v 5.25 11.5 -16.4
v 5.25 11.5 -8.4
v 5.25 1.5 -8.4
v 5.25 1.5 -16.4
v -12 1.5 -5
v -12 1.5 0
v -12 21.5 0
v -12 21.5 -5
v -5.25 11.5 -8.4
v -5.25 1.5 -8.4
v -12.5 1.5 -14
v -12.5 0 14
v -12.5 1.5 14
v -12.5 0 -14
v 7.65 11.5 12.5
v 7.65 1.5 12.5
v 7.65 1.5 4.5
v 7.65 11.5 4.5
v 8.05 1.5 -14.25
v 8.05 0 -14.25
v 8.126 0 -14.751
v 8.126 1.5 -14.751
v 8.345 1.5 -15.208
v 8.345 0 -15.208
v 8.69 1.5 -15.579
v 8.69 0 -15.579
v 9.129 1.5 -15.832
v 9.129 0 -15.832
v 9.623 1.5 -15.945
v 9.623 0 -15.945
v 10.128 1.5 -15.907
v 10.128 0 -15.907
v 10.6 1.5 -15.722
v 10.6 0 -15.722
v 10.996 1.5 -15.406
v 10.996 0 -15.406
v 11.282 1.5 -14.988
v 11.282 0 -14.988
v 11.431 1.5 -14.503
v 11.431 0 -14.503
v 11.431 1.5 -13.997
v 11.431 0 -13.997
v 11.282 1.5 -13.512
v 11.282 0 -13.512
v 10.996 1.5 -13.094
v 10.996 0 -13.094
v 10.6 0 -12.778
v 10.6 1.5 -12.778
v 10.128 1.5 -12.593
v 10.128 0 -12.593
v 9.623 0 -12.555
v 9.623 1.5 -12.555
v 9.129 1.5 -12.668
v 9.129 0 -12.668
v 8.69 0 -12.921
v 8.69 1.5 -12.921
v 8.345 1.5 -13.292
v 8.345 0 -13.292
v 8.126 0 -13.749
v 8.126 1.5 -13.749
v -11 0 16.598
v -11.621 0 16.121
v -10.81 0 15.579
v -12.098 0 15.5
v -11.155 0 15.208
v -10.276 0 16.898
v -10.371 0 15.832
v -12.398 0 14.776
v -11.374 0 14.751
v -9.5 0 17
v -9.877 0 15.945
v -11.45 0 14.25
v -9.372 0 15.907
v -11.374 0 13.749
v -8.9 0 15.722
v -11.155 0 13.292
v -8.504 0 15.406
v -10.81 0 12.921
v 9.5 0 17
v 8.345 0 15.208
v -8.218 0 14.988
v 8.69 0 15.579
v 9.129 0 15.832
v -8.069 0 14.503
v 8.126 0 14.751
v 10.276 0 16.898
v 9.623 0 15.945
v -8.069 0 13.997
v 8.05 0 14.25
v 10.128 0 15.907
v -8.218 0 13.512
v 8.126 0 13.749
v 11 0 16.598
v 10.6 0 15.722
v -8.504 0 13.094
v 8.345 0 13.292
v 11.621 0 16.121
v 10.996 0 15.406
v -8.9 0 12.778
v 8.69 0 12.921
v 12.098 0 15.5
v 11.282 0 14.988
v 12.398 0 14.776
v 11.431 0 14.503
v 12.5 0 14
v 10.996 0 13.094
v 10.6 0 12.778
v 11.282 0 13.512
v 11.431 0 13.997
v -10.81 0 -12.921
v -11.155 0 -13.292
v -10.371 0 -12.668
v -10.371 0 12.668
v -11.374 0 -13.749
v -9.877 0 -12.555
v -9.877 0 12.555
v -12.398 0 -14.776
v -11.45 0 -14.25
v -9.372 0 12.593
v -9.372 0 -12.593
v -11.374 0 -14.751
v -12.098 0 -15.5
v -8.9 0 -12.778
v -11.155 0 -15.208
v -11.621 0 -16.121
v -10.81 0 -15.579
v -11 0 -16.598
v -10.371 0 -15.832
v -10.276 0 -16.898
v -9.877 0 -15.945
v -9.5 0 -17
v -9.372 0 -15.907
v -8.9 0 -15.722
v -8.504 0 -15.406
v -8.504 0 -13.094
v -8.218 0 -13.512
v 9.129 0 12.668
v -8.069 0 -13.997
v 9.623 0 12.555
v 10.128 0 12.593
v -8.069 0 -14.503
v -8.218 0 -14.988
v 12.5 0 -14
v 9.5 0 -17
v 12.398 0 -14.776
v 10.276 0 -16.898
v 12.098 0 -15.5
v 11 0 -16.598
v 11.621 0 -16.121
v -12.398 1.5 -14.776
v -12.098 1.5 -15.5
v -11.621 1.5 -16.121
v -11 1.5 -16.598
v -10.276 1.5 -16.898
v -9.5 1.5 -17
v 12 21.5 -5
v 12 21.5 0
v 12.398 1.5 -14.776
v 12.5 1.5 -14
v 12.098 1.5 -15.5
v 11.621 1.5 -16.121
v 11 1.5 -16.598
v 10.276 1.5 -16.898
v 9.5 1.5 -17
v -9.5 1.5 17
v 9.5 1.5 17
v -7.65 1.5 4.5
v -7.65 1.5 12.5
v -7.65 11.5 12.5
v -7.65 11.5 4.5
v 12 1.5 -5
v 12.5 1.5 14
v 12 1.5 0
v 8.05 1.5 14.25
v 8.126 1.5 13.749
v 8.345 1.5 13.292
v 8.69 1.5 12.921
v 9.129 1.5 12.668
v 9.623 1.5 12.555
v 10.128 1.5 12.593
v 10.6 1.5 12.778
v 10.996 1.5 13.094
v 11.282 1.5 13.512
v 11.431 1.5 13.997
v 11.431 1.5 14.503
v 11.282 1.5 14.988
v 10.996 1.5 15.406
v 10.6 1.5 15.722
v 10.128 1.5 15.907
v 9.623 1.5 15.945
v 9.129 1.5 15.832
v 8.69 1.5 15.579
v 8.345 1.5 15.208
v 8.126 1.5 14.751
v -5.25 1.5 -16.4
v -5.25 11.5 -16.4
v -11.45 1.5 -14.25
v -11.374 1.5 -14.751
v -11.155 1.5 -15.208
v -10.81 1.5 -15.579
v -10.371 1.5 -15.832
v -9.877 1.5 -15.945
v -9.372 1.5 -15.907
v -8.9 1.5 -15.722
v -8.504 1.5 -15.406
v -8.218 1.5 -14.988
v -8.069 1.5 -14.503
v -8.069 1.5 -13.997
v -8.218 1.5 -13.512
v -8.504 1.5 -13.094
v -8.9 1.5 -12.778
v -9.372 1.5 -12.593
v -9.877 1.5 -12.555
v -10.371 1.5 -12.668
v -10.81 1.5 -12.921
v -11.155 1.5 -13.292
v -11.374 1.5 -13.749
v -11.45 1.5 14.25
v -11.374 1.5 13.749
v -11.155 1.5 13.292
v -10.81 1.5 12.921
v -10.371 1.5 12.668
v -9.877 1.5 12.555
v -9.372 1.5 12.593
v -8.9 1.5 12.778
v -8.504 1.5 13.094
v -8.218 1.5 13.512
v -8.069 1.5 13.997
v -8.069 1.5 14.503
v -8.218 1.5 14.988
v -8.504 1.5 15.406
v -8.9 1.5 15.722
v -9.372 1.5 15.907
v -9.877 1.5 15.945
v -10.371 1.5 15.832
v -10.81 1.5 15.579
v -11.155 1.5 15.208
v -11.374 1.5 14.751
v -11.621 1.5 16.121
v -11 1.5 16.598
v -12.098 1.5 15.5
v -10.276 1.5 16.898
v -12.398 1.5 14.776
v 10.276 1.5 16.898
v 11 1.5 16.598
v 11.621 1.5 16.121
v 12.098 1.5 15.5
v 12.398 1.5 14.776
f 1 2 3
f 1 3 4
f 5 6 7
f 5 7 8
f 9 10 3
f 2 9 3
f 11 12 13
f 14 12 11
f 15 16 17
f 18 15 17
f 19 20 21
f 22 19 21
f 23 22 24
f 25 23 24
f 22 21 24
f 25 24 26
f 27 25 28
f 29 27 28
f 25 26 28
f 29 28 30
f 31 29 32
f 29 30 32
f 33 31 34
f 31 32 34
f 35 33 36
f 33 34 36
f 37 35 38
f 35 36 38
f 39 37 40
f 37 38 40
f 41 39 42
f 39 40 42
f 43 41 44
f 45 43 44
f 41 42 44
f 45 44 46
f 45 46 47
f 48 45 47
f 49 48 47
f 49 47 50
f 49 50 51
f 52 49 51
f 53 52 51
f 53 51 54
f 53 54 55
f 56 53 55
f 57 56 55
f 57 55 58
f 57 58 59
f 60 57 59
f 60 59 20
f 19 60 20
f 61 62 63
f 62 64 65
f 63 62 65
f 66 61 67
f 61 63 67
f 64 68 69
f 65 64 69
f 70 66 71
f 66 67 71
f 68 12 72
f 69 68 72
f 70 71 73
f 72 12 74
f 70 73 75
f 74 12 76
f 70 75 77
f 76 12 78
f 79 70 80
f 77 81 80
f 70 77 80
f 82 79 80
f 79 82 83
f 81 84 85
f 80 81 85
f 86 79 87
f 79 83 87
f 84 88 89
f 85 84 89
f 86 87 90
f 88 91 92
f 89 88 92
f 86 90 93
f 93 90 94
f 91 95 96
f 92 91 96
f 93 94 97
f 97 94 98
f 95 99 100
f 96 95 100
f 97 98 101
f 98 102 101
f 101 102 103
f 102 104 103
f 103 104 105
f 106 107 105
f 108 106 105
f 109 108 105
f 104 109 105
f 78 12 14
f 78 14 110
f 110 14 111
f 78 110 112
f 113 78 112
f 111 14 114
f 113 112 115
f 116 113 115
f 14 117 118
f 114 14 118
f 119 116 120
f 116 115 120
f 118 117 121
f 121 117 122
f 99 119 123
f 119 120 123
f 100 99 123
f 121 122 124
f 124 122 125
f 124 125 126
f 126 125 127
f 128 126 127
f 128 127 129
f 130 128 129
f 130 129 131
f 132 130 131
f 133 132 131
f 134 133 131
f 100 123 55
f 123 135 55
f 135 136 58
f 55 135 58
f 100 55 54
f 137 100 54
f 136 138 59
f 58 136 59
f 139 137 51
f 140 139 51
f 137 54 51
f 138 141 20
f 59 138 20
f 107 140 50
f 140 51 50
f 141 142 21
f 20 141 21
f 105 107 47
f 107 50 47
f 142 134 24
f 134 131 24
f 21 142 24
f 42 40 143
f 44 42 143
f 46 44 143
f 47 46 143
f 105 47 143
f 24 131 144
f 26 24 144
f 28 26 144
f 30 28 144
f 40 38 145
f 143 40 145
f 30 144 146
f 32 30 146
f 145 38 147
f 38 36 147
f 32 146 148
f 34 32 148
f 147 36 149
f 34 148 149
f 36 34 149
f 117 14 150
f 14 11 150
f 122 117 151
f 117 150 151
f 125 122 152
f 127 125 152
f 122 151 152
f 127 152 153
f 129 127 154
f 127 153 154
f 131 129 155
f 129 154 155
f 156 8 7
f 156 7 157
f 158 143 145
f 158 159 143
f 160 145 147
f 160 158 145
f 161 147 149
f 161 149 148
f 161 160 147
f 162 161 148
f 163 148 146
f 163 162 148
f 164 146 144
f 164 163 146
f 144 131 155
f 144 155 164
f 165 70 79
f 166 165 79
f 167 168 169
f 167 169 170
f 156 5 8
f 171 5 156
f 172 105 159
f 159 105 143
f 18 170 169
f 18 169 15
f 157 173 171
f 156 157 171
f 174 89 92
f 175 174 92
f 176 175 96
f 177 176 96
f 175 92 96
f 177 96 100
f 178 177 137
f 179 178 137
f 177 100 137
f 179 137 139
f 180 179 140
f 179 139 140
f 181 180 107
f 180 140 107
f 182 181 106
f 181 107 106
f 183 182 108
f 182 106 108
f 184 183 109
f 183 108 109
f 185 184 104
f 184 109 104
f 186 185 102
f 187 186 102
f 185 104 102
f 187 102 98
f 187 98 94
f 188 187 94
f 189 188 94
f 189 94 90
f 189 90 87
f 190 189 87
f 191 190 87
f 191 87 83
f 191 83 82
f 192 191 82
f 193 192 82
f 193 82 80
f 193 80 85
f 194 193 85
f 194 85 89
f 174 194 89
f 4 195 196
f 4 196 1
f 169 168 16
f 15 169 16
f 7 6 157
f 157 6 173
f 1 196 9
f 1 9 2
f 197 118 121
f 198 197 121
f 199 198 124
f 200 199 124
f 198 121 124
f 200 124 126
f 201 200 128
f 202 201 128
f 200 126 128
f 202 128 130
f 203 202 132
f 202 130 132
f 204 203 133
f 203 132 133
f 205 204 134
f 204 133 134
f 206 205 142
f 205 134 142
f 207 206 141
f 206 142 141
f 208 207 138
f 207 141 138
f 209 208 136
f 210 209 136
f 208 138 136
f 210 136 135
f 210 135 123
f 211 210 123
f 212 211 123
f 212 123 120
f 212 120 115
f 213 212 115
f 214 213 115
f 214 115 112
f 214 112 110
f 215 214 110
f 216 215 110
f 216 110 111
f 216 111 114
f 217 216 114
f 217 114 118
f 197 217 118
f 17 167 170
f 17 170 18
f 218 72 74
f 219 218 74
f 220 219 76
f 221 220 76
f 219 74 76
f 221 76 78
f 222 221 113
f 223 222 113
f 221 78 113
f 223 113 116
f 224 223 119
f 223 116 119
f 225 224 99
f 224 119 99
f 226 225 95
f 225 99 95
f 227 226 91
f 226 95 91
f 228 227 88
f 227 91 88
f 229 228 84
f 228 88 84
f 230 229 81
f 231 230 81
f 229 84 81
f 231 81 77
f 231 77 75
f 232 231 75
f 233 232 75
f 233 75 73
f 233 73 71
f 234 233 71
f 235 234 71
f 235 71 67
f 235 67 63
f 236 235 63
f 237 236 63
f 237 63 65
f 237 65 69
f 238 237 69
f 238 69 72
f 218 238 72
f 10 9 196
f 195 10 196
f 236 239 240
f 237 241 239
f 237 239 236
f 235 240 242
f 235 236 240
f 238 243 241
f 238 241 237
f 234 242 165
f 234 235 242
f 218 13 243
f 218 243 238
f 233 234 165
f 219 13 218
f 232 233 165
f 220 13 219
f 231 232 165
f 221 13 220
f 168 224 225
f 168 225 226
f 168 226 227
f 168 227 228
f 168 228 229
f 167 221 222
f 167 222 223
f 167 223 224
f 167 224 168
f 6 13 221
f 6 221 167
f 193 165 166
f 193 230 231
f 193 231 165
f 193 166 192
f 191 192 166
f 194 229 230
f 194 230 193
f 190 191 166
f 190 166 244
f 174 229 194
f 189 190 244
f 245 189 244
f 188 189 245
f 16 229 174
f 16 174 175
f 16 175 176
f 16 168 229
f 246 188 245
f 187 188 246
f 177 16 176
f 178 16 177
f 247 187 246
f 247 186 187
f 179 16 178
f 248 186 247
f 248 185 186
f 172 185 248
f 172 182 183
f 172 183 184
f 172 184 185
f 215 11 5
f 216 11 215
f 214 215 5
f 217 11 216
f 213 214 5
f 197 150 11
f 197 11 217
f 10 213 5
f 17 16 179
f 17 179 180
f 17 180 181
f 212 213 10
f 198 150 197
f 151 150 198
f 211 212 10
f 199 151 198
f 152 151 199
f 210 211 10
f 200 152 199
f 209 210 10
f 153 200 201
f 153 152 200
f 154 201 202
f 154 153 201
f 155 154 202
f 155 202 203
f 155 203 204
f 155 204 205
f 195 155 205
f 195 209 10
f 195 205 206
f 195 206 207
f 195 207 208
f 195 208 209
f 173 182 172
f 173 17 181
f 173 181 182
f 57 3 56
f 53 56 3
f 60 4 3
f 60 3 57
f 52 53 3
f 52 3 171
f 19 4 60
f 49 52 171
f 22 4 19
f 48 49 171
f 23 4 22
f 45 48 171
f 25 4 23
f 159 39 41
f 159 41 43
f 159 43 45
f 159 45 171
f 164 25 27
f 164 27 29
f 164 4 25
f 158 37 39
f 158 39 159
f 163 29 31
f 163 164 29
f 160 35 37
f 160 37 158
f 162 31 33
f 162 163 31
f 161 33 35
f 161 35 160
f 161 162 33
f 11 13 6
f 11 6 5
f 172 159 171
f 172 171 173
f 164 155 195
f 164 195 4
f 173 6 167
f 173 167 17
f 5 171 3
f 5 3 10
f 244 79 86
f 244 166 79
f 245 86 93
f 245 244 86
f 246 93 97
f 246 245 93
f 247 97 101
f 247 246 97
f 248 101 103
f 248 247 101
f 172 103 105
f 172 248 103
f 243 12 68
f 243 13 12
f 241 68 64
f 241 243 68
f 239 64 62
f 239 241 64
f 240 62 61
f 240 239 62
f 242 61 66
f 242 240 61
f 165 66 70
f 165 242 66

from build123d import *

# Parameters (mm, degrees)
SKIZZE2_W                       = 25
SKIZZE2_H                       = 34
AUFSATZ_LINEAR_AUSTRAGEN1_DEPTH = 1.5
VERRUNDUNG1_R                   = 3
DURCHGANGSLOCH_F_R_M31_D        = 3.4
SKIZZE5_W                       = 24
SKIZZE5_H                       = 5
AUFSATZ_LINEAR_AUSTRAGEN2_DEPTH = 20
SKIZZE6_W                       = 10.5
SKIZZE6_H                       = 8
SKIZZE6_W_2                     = 15.3
AUFSATZ_LINEAR_AUSTRAGEN3_DEPTH = 10


with BuildPart() as part:
    # Skizze2 → Aufsatz-Linear austragen1 (new body)
    with BuildSketch(Plane(origin=(0, 0, 0), x_dir=(1, 0, 0), z_dir=(0, 1, 0))):
        Rectangle(SKIZZE2_W, SKIZZE2_H)
    extrude(amount=AUFSATZ_LINEAR_AUSTRAGEN1_DEPTH)

    # Verrundung1
    verrundung1_edges = [part.edges().sort_by_distance(p)[0] for p in [
        (12.5, 0.75, 17),
        (-12.5, 0.75, 17),
        (-12.5, 0.75, -17),
        (12.5, 0.75, -17),
    ]]
    fillet(verrundung1_edges, radius=VERRUNDUNG1_R)

    # Durchgangsloch für M31 (through all)
    with Locations(Plane(origin=(0, 1.5, 0), x_dir=(1, 0, 0), z_dir=(0, 1, 0))):
        with Locations((-9.75, 14.25), (9.75, 14.25), (9.75, -14.25), (-9.75, -14.25)):
            Hole(DURCHGANGSLOCH_F_R_M31_D / 2)

    # Skizze5 → Aufsatz-Linear austragen2 (add)
    with BuildSketch(Plane(origin=(0, 1.5, 0), x_dir=(1, 0, 0), z_dir=(0, 1, 0))):
        with Locations((0, 2.5)):
            Rectangle(SKIZZE5_W, SKIZZE5_H)
    extrude(amount=AUFSATZ_LINEAR_AUSTRAGEN2_DEPTH)

    # Skizze6 → Aufsatz-Linear austragen3 (add)
    with BuildSketch(Plane(origin=(0, 1.5, 0), x_dir=(1, 0, 0), z_dir=(0, 1, 0))):
        with Locations((0, 12.4)):
            Rectangle(SKIZZE6_W, SKIZZE6_H)
        with Locations((0, -8.5)):
            Rectangle(SKIZZE6_W_2, SKIZZE6_H)
    extrude(amount=AUFSATZ_LINEAR_AUSTRAGEN3_DEPTH)


solid = part.part
